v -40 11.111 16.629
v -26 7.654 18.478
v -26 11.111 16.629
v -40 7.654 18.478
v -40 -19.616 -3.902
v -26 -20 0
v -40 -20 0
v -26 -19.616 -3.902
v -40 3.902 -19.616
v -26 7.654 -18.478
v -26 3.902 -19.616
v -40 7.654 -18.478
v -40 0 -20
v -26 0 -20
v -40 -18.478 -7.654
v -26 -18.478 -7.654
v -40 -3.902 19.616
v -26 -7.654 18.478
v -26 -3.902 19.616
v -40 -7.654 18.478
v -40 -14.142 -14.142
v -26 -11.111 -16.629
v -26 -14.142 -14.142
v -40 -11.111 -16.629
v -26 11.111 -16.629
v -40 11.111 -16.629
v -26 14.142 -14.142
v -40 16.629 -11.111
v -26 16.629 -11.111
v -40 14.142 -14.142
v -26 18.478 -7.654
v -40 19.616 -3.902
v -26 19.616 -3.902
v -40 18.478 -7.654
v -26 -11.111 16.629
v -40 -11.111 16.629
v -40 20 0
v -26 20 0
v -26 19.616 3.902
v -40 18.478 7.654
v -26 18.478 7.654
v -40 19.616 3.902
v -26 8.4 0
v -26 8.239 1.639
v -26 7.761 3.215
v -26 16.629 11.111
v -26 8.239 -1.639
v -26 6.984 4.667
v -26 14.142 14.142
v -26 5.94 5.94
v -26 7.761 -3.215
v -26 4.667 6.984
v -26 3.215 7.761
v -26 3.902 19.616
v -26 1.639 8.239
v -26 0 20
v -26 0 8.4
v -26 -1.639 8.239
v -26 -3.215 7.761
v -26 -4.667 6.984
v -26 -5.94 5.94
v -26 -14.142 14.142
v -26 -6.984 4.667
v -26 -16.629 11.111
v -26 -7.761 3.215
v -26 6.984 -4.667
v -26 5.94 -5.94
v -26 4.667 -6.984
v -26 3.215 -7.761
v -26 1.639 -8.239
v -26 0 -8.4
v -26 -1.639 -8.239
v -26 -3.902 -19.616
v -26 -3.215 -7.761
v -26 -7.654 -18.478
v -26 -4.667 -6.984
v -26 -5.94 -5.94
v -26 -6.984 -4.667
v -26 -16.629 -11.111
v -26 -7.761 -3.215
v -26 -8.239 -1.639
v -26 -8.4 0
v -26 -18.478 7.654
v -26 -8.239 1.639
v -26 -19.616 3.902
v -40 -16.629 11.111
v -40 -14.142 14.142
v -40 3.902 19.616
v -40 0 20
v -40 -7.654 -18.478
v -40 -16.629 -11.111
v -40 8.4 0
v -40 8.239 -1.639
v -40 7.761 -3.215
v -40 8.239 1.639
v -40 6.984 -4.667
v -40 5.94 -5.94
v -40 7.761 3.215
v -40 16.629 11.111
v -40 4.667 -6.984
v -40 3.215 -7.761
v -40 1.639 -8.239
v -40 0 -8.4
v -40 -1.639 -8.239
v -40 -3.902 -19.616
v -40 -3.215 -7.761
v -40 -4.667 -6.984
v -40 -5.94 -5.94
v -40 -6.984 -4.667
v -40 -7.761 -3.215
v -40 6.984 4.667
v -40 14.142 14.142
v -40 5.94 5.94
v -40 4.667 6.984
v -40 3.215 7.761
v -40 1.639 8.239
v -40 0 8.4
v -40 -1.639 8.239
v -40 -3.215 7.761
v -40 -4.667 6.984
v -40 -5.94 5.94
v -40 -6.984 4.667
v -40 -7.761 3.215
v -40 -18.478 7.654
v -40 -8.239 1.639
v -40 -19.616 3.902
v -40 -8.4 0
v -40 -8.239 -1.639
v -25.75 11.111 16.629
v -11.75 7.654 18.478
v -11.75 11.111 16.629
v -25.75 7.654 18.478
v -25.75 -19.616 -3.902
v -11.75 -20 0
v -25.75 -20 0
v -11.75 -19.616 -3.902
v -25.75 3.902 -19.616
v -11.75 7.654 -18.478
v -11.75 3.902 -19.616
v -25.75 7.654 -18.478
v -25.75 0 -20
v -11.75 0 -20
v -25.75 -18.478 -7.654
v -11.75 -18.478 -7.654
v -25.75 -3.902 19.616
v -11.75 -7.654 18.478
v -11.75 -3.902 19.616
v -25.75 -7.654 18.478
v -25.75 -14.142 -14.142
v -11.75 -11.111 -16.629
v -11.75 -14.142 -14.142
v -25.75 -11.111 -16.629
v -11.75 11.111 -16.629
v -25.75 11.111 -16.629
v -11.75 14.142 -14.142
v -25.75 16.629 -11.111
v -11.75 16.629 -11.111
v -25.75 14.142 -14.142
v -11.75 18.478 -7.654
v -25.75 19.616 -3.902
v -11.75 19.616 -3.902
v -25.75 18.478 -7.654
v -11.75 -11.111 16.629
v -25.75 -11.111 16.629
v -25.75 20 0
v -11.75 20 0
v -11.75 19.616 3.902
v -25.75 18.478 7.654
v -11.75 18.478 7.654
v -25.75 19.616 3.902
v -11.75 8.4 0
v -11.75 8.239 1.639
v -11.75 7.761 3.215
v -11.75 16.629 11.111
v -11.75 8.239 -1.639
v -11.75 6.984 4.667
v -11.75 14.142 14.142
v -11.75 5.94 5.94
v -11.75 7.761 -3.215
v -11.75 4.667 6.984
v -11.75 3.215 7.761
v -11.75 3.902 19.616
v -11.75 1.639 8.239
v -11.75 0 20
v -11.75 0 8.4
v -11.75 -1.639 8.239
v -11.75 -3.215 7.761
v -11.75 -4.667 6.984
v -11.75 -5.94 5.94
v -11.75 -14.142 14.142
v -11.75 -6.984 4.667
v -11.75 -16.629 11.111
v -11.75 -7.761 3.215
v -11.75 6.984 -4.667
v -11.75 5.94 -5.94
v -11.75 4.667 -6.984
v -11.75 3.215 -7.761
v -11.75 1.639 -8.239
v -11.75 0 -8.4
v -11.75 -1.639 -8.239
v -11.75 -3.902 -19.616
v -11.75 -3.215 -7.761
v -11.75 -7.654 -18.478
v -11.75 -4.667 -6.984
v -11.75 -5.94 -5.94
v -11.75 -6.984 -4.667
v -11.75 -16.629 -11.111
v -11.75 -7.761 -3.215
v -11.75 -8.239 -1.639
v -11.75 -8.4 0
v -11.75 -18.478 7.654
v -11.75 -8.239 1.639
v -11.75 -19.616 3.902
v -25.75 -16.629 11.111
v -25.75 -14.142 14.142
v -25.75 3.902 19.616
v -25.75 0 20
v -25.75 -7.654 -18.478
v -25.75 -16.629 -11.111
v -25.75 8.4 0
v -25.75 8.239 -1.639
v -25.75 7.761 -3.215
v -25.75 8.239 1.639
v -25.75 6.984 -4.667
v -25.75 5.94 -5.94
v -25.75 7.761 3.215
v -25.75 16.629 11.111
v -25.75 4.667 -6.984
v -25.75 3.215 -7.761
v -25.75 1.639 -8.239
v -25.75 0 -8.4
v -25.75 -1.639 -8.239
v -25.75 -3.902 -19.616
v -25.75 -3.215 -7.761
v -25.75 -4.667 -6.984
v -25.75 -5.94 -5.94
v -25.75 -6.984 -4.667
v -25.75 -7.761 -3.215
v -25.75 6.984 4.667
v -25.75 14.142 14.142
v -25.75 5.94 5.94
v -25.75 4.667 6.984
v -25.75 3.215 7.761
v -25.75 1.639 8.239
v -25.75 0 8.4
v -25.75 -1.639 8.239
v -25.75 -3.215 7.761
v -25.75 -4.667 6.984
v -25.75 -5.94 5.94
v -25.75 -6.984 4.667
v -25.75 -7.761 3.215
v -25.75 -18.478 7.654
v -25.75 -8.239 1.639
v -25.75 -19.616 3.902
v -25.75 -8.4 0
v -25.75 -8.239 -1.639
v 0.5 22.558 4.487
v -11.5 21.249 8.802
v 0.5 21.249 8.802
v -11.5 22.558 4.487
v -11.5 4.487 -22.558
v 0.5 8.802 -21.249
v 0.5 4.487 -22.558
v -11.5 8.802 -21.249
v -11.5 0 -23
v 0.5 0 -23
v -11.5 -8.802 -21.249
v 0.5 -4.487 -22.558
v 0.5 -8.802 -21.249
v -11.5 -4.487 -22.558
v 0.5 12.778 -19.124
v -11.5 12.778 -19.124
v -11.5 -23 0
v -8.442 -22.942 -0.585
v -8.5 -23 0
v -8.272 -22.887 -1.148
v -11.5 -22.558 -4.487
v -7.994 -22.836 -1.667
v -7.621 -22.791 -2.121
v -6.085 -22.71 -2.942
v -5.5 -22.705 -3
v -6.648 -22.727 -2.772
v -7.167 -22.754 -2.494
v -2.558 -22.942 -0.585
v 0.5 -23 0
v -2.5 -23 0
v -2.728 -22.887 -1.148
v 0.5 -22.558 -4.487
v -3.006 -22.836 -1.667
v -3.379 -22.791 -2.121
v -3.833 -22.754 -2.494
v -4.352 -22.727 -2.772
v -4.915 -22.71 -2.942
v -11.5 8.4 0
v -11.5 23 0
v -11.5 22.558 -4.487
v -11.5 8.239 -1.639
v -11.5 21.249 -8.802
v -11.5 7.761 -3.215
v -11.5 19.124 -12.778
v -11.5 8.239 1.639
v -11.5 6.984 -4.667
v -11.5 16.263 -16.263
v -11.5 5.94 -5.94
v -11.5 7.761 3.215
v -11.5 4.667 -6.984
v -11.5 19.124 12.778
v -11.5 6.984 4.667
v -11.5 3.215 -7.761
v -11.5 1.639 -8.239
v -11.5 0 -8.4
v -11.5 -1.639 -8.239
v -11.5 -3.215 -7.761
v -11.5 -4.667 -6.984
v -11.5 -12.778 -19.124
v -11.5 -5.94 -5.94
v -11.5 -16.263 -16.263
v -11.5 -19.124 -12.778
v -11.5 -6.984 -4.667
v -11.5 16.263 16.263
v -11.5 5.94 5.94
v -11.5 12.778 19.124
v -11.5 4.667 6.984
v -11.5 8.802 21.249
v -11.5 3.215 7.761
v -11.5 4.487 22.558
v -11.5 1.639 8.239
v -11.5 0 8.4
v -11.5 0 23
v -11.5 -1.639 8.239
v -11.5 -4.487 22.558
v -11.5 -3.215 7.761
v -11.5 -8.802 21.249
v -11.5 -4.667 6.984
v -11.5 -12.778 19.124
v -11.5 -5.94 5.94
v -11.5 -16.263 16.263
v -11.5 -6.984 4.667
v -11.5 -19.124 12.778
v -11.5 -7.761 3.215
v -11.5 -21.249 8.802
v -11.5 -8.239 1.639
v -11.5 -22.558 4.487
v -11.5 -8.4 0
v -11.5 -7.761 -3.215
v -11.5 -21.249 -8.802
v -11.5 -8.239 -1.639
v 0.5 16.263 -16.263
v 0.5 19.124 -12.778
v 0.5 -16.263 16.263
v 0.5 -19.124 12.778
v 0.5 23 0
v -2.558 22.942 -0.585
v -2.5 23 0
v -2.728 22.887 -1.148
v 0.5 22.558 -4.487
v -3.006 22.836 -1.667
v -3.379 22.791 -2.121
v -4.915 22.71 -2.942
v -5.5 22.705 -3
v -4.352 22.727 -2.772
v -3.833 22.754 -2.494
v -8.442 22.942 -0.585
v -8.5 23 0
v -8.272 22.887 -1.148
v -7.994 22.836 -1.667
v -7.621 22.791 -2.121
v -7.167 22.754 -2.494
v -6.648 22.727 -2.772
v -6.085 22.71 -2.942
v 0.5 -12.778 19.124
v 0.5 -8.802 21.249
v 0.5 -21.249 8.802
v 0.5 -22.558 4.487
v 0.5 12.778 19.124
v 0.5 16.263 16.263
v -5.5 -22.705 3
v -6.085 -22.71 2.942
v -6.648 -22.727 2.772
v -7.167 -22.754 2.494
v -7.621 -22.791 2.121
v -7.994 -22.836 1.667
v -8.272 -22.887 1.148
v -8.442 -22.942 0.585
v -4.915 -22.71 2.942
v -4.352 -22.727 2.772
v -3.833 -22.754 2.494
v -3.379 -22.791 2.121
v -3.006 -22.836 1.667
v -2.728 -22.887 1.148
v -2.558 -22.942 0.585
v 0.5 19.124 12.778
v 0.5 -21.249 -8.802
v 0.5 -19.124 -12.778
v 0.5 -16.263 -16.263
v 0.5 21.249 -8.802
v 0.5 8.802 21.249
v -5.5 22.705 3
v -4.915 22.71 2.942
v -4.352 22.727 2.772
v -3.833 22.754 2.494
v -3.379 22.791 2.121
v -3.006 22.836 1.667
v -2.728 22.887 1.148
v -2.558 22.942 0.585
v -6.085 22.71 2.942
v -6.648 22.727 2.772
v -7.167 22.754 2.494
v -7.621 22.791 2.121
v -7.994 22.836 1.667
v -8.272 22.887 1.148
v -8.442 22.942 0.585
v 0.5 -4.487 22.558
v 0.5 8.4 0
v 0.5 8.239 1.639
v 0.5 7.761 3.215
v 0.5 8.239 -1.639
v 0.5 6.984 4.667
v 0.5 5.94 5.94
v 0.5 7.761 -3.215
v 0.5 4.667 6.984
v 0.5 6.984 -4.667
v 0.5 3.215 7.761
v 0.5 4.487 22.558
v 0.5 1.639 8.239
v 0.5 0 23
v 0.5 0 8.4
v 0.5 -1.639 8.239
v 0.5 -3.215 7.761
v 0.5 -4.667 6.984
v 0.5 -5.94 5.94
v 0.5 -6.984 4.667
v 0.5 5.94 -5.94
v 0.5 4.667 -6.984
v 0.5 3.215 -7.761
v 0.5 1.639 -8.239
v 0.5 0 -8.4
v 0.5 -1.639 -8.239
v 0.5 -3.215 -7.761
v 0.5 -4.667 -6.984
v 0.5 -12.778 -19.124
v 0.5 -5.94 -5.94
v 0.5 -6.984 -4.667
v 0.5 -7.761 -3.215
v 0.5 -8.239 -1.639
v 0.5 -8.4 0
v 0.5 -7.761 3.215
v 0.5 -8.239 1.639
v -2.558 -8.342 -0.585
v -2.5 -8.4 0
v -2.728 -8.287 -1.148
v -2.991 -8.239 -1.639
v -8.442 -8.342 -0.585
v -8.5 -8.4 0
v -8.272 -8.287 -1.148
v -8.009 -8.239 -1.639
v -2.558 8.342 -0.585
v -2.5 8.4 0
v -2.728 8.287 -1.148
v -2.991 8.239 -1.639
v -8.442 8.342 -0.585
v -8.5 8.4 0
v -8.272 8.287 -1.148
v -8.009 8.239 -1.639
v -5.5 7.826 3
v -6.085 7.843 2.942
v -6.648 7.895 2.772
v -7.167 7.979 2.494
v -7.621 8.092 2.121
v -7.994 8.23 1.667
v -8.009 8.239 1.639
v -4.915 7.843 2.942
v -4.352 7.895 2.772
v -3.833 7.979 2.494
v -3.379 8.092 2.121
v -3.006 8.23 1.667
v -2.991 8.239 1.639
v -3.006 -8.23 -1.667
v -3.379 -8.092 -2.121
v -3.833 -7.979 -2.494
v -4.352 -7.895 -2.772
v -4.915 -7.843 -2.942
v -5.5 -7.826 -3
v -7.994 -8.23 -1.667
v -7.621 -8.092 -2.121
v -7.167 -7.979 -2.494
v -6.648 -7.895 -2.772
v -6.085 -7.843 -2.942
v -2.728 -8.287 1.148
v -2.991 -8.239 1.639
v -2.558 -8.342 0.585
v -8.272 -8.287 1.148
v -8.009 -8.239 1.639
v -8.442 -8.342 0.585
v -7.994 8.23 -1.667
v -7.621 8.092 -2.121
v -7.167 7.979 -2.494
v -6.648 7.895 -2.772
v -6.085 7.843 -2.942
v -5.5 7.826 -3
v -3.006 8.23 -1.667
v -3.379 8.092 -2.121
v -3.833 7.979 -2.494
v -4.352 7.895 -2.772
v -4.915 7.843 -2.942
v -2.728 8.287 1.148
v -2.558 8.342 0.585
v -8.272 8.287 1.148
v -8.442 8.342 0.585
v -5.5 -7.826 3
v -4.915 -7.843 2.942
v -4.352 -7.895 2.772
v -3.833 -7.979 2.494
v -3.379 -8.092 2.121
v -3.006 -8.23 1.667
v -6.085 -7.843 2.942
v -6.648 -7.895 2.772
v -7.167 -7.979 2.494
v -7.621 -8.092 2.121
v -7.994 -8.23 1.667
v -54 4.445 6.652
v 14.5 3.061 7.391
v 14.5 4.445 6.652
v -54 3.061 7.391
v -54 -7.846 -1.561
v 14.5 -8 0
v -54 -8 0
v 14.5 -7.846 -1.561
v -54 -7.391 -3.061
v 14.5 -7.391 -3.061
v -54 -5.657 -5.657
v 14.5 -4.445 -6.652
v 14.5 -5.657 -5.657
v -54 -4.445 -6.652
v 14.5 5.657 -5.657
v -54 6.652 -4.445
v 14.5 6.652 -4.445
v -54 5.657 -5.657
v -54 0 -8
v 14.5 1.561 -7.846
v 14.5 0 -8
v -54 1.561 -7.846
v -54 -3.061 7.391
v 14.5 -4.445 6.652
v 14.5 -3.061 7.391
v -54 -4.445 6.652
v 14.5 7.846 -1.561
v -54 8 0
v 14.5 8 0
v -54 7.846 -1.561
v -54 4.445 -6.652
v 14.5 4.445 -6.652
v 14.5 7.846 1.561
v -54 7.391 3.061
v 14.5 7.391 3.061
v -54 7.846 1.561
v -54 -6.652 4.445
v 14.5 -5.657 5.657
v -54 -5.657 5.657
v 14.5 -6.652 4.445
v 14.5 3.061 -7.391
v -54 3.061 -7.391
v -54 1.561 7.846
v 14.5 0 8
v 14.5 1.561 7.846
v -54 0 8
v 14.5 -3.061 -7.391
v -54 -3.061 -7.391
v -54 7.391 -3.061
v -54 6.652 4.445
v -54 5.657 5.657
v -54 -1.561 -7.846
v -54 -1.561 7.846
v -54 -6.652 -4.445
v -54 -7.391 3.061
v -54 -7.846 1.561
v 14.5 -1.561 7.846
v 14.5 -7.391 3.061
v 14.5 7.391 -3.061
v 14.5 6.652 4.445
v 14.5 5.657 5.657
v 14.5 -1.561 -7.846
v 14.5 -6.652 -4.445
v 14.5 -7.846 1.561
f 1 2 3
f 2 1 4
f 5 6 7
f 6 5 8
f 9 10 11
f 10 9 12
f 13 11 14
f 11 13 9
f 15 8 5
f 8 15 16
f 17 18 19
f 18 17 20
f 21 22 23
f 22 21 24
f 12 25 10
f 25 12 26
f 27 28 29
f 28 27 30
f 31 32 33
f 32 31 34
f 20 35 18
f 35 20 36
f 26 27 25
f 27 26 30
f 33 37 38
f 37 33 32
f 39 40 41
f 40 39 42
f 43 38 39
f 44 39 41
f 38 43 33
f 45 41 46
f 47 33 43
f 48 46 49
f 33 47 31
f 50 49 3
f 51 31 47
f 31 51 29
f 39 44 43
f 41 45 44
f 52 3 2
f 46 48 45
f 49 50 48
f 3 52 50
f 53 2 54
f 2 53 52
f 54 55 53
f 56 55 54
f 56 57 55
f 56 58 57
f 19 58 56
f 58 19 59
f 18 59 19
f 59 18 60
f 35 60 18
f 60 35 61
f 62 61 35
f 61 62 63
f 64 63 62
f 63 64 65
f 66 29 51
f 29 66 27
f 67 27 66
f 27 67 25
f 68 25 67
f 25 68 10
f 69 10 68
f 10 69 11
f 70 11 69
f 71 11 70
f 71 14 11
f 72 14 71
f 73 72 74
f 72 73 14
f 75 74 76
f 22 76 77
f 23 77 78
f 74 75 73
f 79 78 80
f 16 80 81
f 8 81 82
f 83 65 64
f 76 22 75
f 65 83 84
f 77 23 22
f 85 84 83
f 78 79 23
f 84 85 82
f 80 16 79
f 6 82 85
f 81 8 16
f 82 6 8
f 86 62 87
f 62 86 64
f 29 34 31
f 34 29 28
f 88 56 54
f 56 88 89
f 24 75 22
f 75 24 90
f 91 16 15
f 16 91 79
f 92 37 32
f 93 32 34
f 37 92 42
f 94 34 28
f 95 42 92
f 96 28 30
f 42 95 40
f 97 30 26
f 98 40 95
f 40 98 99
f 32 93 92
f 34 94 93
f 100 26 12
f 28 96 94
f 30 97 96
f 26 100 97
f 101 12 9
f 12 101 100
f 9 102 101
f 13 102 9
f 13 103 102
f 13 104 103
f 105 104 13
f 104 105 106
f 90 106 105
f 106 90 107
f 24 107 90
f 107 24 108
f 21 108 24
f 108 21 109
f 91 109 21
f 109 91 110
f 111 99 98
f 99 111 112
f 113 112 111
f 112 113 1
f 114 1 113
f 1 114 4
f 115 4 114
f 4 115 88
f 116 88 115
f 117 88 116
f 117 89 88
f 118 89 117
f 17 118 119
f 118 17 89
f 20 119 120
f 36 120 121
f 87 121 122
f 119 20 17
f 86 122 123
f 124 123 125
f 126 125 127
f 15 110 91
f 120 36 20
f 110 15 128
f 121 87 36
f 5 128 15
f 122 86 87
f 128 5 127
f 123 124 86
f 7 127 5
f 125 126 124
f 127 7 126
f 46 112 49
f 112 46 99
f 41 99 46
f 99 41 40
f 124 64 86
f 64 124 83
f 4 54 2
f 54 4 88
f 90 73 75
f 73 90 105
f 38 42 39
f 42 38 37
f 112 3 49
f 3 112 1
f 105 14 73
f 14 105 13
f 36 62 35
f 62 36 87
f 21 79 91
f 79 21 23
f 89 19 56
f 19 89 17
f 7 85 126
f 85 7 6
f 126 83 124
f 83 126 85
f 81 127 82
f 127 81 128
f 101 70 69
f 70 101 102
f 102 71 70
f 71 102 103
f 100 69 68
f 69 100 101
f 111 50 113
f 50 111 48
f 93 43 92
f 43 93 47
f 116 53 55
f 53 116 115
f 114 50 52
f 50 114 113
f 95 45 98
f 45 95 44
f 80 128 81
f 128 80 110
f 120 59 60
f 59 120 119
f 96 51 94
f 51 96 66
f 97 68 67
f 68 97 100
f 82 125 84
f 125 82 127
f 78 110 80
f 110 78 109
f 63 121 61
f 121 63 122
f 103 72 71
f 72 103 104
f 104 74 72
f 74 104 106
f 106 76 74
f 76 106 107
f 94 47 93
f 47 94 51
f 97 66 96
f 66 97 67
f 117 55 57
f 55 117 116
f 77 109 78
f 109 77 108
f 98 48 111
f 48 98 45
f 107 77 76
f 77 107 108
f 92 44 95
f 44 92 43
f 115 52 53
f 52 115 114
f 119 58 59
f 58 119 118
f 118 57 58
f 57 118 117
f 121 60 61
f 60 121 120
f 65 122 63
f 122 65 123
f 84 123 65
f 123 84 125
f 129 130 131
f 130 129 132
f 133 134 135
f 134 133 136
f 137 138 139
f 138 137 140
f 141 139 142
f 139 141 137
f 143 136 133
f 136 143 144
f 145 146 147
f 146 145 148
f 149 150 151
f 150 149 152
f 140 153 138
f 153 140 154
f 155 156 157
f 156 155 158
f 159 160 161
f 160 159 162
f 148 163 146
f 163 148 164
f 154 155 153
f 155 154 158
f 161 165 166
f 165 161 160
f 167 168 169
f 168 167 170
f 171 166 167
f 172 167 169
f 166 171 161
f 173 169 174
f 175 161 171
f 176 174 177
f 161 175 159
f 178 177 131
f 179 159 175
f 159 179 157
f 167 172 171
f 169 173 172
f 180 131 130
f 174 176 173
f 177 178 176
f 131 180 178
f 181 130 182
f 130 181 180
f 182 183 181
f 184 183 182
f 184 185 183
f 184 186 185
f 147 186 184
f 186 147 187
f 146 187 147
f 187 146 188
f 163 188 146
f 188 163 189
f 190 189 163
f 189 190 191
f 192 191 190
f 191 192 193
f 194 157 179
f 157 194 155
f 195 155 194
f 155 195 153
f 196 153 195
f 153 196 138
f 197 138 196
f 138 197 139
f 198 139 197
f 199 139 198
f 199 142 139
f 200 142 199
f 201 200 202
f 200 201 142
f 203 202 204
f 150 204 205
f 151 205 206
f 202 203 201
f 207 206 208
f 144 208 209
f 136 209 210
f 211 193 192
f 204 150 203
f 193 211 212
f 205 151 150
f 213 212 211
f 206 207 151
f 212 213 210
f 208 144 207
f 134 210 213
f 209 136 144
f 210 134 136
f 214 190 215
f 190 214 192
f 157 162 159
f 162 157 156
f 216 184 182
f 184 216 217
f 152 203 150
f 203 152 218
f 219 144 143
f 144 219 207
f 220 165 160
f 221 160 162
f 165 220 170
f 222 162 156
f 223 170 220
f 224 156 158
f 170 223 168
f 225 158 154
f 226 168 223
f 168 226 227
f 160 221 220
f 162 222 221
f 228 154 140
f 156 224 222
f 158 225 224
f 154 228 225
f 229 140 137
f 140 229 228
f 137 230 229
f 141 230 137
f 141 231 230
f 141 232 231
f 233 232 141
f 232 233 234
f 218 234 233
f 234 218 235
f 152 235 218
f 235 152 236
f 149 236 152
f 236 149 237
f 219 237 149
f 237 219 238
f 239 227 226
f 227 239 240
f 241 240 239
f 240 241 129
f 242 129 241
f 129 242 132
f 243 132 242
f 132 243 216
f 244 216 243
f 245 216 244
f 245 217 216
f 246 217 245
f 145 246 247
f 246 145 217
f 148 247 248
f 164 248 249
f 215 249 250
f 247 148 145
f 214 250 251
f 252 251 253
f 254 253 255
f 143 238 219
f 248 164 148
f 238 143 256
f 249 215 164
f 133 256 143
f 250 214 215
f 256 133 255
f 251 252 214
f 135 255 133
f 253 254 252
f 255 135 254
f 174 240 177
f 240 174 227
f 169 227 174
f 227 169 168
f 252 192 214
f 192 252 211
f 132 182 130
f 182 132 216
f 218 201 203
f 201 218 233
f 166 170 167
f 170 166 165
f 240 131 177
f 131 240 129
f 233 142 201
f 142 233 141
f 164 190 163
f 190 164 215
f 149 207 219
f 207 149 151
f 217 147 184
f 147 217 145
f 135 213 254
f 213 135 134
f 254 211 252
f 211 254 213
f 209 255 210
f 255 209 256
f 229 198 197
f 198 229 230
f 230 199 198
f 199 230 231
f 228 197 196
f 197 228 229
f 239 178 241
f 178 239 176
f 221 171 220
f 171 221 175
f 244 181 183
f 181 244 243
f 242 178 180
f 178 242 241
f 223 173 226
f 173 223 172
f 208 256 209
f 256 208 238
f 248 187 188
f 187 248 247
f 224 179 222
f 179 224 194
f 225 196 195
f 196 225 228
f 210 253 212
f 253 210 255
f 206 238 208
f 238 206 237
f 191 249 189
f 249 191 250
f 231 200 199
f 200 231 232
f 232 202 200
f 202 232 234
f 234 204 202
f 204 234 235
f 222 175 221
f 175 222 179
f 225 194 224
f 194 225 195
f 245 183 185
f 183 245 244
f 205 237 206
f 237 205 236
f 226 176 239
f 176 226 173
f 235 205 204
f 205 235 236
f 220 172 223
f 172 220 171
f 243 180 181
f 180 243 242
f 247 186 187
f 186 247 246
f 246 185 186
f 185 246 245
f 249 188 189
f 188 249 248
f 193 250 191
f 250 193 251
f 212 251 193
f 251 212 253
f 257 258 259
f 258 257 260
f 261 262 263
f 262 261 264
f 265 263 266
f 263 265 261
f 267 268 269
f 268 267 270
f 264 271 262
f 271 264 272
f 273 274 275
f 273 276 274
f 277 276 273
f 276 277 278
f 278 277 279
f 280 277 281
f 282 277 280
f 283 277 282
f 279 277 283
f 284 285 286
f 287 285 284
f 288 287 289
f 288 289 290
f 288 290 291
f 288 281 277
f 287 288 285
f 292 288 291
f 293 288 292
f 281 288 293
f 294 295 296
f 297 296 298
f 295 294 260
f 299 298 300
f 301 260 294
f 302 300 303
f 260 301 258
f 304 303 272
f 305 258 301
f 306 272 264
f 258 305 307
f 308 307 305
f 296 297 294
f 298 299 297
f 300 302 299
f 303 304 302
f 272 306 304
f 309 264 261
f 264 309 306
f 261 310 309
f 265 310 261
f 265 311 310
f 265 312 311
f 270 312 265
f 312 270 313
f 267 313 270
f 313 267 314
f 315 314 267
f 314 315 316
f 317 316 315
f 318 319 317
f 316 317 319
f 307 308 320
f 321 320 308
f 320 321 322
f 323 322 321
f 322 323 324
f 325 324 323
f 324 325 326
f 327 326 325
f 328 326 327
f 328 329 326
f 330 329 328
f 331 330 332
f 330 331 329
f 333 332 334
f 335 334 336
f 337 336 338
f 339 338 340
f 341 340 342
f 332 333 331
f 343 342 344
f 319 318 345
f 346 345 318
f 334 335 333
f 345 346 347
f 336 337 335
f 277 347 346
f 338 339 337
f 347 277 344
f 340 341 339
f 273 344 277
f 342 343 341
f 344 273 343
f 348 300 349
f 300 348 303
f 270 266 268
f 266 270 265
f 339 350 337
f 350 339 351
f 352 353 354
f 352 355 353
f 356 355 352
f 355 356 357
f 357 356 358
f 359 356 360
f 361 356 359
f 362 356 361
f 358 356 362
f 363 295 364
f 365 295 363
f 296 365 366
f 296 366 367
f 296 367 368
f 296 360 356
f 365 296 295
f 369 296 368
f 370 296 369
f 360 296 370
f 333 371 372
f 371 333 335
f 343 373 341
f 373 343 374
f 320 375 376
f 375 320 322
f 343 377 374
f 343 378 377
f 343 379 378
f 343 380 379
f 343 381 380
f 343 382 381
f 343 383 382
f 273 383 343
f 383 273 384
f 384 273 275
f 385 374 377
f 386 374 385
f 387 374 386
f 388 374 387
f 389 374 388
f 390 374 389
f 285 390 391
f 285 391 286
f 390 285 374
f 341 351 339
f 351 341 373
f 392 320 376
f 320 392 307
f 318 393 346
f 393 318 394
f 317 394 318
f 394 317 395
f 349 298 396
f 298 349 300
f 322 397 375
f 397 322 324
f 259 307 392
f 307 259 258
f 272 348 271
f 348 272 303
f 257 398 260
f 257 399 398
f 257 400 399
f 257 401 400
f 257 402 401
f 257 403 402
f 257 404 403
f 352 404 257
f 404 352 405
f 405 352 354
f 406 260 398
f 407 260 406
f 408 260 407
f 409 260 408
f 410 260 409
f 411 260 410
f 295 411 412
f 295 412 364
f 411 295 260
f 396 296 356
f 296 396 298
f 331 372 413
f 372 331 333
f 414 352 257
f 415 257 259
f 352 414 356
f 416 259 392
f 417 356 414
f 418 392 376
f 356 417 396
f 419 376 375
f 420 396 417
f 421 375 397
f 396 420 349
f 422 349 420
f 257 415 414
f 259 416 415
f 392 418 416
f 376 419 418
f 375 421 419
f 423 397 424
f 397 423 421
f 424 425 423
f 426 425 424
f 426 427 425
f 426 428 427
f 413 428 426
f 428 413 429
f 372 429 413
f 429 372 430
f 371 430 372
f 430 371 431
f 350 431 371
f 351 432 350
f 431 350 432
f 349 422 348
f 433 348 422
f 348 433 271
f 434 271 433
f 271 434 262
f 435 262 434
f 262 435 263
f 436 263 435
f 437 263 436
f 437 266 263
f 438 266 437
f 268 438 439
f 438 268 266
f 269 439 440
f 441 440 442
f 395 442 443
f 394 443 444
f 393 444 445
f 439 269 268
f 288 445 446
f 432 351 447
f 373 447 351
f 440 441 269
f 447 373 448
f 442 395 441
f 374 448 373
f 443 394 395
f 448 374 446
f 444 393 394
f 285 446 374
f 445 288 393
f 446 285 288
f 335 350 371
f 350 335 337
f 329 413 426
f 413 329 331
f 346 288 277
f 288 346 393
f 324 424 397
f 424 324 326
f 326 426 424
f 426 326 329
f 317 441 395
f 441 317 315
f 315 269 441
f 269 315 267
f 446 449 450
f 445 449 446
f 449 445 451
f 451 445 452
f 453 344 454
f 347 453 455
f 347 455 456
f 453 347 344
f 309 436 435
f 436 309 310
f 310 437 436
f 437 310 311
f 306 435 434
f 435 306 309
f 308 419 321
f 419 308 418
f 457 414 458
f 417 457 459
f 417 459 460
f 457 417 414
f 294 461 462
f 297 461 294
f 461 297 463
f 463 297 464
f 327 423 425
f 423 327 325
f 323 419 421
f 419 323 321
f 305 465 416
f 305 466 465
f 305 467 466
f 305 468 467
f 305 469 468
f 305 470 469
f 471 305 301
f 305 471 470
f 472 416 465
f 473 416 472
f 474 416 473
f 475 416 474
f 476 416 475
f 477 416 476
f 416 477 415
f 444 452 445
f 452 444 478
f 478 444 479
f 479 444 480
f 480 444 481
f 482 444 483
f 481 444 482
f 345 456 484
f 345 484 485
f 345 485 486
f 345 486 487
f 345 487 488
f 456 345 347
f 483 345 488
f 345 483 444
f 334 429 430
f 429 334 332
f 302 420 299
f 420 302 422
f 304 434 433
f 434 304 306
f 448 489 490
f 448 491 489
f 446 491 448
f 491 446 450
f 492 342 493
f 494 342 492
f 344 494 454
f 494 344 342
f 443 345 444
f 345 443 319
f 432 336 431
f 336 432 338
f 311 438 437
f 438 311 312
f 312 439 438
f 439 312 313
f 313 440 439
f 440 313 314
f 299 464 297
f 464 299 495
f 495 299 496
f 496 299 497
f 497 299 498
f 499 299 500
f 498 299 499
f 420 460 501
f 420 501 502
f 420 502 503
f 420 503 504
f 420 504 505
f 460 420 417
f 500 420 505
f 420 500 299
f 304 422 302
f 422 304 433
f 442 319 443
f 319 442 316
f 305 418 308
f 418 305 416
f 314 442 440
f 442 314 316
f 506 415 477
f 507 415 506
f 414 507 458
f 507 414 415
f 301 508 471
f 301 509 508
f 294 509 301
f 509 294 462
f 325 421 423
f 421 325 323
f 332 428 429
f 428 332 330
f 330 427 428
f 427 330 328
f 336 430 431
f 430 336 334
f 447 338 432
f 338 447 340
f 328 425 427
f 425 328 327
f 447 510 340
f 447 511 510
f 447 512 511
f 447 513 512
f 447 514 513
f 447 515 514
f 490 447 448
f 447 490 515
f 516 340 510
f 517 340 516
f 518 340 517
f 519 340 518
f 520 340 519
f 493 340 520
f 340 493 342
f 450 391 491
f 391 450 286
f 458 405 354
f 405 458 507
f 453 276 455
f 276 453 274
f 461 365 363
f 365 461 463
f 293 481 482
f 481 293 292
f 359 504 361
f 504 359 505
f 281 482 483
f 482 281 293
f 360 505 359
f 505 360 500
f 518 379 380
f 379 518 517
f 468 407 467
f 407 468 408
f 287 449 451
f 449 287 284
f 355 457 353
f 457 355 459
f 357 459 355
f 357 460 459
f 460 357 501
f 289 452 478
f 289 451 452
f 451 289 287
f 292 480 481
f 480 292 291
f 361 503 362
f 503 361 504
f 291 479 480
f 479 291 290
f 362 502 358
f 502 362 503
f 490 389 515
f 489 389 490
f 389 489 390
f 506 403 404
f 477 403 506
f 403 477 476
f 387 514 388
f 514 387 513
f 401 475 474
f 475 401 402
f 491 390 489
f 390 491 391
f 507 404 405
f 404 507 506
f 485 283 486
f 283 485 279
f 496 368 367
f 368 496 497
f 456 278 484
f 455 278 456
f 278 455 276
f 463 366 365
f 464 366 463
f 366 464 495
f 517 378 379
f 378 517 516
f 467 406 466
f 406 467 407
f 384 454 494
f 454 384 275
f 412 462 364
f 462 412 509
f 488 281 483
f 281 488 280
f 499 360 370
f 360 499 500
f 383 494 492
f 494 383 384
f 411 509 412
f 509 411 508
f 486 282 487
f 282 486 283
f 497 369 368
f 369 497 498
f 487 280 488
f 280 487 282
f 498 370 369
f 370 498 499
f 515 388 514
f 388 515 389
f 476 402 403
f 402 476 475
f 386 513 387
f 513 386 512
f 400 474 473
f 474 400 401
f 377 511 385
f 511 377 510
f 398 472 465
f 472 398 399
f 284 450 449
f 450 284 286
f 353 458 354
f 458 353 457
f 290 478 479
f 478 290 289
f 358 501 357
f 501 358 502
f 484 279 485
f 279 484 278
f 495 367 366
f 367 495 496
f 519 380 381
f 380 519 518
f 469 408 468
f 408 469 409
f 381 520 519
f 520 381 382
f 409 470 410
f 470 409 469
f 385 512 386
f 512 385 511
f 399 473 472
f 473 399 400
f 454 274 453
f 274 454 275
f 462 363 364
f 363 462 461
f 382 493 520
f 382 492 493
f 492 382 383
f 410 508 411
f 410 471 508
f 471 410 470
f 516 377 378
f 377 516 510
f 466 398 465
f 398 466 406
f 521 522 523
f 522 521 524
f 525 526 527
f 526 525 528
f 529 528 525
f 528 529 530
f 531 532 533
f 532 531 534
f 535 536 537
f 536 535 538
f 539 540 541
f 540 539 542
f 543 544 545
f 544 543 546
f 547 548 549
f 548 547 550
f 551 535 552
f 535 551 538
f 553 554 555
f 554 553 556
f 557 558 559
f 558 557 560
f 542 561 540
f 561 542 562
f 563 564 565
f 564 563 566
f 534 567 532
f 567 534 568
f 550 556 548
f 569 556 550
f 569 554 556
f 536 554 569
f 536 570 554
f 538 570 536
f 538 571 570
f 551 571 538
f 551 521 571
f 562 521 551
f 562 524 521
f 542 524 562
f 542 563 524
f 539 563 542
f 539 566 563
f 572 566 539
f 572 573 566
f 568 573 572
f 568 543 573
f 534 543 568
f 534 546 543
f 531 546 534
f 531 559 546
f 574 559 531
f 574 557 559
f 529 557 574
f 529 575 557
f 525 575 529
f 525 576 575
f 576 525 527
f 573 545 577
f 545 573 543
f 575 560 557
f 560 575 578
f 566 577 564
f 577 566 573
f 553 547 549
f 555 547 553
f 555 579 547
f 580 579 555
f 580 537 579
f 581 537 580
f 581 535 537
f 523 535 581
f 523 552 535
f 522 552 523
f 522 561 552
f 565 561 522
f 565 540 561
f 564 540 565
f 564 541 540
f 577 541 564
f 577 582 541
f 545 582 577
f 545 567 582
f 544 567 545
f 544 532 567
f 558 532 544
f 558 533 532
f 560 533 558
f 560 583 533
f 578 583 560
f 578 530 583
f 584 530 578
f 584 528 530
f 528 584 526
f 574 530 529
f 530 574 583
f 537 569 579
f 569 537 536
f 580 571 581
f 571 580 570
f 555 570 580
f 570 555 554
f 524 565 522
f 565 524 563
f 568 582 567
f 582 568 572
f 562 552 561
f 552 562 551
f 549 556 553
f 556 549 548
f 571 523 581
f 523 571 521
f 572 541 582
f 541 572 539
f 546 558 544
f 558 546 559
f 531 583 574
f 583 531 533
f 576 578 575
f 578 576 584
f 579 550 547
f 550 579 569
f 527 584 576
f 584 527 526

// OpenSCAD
$fn = 32;

// ------------------------------------------------------------------------
// Shaft with rings and collars: d16 shaft, 3 rings
// Every part is its own module, assembly() places them once.
// ------------------------------------------------------------------------

// --- part 1 ---
module shaft() {
  translate([0, 0, -34.25]) cylinder(h = 68.5, d = 16);
}

// --- part 2 ---
module spacer_a() {
  difference() {
      translate([0, 0, 0]) cylinder(h = 14, d = 40);
      translate([0, 0, -1]) cylinder(h = 16, d = 16.8);
    }
}

// --- part 3 ---
module spacer_b() {
  difference() {
      translate([0, 0, 0]) cylinder(h = 14, d = 40);
      translate([0, 0, -1]) cylinder(h = 16, d = 16.8);
    }
}

// --- part 4 ---
module collar_a() {
  difference() {
    cylinder(h = 12, d = 46);
    translate([0, 0, -1]) cylinder(h = 14, d = 16.8);
    translate([0, 0, 6]) rotate([90, 0, 0]) cylinder(h = 48, d = 6, center = true);
  }
}

// --- assembly ---
module assembly() {
  translate([-19.75, 0, 0]) rotate([0, 90, 0]) shaft();
  translate([-40, 0, 0]) rotate([0, 90, 0]) spacer_a();
  translate([-25.75, 0, 0]) rotate([0, 90, 0]) spacer_b();
  translate([-11.5, 0, 0]) rotate([0, 90, 0]) collar_a();
}

assembly();
